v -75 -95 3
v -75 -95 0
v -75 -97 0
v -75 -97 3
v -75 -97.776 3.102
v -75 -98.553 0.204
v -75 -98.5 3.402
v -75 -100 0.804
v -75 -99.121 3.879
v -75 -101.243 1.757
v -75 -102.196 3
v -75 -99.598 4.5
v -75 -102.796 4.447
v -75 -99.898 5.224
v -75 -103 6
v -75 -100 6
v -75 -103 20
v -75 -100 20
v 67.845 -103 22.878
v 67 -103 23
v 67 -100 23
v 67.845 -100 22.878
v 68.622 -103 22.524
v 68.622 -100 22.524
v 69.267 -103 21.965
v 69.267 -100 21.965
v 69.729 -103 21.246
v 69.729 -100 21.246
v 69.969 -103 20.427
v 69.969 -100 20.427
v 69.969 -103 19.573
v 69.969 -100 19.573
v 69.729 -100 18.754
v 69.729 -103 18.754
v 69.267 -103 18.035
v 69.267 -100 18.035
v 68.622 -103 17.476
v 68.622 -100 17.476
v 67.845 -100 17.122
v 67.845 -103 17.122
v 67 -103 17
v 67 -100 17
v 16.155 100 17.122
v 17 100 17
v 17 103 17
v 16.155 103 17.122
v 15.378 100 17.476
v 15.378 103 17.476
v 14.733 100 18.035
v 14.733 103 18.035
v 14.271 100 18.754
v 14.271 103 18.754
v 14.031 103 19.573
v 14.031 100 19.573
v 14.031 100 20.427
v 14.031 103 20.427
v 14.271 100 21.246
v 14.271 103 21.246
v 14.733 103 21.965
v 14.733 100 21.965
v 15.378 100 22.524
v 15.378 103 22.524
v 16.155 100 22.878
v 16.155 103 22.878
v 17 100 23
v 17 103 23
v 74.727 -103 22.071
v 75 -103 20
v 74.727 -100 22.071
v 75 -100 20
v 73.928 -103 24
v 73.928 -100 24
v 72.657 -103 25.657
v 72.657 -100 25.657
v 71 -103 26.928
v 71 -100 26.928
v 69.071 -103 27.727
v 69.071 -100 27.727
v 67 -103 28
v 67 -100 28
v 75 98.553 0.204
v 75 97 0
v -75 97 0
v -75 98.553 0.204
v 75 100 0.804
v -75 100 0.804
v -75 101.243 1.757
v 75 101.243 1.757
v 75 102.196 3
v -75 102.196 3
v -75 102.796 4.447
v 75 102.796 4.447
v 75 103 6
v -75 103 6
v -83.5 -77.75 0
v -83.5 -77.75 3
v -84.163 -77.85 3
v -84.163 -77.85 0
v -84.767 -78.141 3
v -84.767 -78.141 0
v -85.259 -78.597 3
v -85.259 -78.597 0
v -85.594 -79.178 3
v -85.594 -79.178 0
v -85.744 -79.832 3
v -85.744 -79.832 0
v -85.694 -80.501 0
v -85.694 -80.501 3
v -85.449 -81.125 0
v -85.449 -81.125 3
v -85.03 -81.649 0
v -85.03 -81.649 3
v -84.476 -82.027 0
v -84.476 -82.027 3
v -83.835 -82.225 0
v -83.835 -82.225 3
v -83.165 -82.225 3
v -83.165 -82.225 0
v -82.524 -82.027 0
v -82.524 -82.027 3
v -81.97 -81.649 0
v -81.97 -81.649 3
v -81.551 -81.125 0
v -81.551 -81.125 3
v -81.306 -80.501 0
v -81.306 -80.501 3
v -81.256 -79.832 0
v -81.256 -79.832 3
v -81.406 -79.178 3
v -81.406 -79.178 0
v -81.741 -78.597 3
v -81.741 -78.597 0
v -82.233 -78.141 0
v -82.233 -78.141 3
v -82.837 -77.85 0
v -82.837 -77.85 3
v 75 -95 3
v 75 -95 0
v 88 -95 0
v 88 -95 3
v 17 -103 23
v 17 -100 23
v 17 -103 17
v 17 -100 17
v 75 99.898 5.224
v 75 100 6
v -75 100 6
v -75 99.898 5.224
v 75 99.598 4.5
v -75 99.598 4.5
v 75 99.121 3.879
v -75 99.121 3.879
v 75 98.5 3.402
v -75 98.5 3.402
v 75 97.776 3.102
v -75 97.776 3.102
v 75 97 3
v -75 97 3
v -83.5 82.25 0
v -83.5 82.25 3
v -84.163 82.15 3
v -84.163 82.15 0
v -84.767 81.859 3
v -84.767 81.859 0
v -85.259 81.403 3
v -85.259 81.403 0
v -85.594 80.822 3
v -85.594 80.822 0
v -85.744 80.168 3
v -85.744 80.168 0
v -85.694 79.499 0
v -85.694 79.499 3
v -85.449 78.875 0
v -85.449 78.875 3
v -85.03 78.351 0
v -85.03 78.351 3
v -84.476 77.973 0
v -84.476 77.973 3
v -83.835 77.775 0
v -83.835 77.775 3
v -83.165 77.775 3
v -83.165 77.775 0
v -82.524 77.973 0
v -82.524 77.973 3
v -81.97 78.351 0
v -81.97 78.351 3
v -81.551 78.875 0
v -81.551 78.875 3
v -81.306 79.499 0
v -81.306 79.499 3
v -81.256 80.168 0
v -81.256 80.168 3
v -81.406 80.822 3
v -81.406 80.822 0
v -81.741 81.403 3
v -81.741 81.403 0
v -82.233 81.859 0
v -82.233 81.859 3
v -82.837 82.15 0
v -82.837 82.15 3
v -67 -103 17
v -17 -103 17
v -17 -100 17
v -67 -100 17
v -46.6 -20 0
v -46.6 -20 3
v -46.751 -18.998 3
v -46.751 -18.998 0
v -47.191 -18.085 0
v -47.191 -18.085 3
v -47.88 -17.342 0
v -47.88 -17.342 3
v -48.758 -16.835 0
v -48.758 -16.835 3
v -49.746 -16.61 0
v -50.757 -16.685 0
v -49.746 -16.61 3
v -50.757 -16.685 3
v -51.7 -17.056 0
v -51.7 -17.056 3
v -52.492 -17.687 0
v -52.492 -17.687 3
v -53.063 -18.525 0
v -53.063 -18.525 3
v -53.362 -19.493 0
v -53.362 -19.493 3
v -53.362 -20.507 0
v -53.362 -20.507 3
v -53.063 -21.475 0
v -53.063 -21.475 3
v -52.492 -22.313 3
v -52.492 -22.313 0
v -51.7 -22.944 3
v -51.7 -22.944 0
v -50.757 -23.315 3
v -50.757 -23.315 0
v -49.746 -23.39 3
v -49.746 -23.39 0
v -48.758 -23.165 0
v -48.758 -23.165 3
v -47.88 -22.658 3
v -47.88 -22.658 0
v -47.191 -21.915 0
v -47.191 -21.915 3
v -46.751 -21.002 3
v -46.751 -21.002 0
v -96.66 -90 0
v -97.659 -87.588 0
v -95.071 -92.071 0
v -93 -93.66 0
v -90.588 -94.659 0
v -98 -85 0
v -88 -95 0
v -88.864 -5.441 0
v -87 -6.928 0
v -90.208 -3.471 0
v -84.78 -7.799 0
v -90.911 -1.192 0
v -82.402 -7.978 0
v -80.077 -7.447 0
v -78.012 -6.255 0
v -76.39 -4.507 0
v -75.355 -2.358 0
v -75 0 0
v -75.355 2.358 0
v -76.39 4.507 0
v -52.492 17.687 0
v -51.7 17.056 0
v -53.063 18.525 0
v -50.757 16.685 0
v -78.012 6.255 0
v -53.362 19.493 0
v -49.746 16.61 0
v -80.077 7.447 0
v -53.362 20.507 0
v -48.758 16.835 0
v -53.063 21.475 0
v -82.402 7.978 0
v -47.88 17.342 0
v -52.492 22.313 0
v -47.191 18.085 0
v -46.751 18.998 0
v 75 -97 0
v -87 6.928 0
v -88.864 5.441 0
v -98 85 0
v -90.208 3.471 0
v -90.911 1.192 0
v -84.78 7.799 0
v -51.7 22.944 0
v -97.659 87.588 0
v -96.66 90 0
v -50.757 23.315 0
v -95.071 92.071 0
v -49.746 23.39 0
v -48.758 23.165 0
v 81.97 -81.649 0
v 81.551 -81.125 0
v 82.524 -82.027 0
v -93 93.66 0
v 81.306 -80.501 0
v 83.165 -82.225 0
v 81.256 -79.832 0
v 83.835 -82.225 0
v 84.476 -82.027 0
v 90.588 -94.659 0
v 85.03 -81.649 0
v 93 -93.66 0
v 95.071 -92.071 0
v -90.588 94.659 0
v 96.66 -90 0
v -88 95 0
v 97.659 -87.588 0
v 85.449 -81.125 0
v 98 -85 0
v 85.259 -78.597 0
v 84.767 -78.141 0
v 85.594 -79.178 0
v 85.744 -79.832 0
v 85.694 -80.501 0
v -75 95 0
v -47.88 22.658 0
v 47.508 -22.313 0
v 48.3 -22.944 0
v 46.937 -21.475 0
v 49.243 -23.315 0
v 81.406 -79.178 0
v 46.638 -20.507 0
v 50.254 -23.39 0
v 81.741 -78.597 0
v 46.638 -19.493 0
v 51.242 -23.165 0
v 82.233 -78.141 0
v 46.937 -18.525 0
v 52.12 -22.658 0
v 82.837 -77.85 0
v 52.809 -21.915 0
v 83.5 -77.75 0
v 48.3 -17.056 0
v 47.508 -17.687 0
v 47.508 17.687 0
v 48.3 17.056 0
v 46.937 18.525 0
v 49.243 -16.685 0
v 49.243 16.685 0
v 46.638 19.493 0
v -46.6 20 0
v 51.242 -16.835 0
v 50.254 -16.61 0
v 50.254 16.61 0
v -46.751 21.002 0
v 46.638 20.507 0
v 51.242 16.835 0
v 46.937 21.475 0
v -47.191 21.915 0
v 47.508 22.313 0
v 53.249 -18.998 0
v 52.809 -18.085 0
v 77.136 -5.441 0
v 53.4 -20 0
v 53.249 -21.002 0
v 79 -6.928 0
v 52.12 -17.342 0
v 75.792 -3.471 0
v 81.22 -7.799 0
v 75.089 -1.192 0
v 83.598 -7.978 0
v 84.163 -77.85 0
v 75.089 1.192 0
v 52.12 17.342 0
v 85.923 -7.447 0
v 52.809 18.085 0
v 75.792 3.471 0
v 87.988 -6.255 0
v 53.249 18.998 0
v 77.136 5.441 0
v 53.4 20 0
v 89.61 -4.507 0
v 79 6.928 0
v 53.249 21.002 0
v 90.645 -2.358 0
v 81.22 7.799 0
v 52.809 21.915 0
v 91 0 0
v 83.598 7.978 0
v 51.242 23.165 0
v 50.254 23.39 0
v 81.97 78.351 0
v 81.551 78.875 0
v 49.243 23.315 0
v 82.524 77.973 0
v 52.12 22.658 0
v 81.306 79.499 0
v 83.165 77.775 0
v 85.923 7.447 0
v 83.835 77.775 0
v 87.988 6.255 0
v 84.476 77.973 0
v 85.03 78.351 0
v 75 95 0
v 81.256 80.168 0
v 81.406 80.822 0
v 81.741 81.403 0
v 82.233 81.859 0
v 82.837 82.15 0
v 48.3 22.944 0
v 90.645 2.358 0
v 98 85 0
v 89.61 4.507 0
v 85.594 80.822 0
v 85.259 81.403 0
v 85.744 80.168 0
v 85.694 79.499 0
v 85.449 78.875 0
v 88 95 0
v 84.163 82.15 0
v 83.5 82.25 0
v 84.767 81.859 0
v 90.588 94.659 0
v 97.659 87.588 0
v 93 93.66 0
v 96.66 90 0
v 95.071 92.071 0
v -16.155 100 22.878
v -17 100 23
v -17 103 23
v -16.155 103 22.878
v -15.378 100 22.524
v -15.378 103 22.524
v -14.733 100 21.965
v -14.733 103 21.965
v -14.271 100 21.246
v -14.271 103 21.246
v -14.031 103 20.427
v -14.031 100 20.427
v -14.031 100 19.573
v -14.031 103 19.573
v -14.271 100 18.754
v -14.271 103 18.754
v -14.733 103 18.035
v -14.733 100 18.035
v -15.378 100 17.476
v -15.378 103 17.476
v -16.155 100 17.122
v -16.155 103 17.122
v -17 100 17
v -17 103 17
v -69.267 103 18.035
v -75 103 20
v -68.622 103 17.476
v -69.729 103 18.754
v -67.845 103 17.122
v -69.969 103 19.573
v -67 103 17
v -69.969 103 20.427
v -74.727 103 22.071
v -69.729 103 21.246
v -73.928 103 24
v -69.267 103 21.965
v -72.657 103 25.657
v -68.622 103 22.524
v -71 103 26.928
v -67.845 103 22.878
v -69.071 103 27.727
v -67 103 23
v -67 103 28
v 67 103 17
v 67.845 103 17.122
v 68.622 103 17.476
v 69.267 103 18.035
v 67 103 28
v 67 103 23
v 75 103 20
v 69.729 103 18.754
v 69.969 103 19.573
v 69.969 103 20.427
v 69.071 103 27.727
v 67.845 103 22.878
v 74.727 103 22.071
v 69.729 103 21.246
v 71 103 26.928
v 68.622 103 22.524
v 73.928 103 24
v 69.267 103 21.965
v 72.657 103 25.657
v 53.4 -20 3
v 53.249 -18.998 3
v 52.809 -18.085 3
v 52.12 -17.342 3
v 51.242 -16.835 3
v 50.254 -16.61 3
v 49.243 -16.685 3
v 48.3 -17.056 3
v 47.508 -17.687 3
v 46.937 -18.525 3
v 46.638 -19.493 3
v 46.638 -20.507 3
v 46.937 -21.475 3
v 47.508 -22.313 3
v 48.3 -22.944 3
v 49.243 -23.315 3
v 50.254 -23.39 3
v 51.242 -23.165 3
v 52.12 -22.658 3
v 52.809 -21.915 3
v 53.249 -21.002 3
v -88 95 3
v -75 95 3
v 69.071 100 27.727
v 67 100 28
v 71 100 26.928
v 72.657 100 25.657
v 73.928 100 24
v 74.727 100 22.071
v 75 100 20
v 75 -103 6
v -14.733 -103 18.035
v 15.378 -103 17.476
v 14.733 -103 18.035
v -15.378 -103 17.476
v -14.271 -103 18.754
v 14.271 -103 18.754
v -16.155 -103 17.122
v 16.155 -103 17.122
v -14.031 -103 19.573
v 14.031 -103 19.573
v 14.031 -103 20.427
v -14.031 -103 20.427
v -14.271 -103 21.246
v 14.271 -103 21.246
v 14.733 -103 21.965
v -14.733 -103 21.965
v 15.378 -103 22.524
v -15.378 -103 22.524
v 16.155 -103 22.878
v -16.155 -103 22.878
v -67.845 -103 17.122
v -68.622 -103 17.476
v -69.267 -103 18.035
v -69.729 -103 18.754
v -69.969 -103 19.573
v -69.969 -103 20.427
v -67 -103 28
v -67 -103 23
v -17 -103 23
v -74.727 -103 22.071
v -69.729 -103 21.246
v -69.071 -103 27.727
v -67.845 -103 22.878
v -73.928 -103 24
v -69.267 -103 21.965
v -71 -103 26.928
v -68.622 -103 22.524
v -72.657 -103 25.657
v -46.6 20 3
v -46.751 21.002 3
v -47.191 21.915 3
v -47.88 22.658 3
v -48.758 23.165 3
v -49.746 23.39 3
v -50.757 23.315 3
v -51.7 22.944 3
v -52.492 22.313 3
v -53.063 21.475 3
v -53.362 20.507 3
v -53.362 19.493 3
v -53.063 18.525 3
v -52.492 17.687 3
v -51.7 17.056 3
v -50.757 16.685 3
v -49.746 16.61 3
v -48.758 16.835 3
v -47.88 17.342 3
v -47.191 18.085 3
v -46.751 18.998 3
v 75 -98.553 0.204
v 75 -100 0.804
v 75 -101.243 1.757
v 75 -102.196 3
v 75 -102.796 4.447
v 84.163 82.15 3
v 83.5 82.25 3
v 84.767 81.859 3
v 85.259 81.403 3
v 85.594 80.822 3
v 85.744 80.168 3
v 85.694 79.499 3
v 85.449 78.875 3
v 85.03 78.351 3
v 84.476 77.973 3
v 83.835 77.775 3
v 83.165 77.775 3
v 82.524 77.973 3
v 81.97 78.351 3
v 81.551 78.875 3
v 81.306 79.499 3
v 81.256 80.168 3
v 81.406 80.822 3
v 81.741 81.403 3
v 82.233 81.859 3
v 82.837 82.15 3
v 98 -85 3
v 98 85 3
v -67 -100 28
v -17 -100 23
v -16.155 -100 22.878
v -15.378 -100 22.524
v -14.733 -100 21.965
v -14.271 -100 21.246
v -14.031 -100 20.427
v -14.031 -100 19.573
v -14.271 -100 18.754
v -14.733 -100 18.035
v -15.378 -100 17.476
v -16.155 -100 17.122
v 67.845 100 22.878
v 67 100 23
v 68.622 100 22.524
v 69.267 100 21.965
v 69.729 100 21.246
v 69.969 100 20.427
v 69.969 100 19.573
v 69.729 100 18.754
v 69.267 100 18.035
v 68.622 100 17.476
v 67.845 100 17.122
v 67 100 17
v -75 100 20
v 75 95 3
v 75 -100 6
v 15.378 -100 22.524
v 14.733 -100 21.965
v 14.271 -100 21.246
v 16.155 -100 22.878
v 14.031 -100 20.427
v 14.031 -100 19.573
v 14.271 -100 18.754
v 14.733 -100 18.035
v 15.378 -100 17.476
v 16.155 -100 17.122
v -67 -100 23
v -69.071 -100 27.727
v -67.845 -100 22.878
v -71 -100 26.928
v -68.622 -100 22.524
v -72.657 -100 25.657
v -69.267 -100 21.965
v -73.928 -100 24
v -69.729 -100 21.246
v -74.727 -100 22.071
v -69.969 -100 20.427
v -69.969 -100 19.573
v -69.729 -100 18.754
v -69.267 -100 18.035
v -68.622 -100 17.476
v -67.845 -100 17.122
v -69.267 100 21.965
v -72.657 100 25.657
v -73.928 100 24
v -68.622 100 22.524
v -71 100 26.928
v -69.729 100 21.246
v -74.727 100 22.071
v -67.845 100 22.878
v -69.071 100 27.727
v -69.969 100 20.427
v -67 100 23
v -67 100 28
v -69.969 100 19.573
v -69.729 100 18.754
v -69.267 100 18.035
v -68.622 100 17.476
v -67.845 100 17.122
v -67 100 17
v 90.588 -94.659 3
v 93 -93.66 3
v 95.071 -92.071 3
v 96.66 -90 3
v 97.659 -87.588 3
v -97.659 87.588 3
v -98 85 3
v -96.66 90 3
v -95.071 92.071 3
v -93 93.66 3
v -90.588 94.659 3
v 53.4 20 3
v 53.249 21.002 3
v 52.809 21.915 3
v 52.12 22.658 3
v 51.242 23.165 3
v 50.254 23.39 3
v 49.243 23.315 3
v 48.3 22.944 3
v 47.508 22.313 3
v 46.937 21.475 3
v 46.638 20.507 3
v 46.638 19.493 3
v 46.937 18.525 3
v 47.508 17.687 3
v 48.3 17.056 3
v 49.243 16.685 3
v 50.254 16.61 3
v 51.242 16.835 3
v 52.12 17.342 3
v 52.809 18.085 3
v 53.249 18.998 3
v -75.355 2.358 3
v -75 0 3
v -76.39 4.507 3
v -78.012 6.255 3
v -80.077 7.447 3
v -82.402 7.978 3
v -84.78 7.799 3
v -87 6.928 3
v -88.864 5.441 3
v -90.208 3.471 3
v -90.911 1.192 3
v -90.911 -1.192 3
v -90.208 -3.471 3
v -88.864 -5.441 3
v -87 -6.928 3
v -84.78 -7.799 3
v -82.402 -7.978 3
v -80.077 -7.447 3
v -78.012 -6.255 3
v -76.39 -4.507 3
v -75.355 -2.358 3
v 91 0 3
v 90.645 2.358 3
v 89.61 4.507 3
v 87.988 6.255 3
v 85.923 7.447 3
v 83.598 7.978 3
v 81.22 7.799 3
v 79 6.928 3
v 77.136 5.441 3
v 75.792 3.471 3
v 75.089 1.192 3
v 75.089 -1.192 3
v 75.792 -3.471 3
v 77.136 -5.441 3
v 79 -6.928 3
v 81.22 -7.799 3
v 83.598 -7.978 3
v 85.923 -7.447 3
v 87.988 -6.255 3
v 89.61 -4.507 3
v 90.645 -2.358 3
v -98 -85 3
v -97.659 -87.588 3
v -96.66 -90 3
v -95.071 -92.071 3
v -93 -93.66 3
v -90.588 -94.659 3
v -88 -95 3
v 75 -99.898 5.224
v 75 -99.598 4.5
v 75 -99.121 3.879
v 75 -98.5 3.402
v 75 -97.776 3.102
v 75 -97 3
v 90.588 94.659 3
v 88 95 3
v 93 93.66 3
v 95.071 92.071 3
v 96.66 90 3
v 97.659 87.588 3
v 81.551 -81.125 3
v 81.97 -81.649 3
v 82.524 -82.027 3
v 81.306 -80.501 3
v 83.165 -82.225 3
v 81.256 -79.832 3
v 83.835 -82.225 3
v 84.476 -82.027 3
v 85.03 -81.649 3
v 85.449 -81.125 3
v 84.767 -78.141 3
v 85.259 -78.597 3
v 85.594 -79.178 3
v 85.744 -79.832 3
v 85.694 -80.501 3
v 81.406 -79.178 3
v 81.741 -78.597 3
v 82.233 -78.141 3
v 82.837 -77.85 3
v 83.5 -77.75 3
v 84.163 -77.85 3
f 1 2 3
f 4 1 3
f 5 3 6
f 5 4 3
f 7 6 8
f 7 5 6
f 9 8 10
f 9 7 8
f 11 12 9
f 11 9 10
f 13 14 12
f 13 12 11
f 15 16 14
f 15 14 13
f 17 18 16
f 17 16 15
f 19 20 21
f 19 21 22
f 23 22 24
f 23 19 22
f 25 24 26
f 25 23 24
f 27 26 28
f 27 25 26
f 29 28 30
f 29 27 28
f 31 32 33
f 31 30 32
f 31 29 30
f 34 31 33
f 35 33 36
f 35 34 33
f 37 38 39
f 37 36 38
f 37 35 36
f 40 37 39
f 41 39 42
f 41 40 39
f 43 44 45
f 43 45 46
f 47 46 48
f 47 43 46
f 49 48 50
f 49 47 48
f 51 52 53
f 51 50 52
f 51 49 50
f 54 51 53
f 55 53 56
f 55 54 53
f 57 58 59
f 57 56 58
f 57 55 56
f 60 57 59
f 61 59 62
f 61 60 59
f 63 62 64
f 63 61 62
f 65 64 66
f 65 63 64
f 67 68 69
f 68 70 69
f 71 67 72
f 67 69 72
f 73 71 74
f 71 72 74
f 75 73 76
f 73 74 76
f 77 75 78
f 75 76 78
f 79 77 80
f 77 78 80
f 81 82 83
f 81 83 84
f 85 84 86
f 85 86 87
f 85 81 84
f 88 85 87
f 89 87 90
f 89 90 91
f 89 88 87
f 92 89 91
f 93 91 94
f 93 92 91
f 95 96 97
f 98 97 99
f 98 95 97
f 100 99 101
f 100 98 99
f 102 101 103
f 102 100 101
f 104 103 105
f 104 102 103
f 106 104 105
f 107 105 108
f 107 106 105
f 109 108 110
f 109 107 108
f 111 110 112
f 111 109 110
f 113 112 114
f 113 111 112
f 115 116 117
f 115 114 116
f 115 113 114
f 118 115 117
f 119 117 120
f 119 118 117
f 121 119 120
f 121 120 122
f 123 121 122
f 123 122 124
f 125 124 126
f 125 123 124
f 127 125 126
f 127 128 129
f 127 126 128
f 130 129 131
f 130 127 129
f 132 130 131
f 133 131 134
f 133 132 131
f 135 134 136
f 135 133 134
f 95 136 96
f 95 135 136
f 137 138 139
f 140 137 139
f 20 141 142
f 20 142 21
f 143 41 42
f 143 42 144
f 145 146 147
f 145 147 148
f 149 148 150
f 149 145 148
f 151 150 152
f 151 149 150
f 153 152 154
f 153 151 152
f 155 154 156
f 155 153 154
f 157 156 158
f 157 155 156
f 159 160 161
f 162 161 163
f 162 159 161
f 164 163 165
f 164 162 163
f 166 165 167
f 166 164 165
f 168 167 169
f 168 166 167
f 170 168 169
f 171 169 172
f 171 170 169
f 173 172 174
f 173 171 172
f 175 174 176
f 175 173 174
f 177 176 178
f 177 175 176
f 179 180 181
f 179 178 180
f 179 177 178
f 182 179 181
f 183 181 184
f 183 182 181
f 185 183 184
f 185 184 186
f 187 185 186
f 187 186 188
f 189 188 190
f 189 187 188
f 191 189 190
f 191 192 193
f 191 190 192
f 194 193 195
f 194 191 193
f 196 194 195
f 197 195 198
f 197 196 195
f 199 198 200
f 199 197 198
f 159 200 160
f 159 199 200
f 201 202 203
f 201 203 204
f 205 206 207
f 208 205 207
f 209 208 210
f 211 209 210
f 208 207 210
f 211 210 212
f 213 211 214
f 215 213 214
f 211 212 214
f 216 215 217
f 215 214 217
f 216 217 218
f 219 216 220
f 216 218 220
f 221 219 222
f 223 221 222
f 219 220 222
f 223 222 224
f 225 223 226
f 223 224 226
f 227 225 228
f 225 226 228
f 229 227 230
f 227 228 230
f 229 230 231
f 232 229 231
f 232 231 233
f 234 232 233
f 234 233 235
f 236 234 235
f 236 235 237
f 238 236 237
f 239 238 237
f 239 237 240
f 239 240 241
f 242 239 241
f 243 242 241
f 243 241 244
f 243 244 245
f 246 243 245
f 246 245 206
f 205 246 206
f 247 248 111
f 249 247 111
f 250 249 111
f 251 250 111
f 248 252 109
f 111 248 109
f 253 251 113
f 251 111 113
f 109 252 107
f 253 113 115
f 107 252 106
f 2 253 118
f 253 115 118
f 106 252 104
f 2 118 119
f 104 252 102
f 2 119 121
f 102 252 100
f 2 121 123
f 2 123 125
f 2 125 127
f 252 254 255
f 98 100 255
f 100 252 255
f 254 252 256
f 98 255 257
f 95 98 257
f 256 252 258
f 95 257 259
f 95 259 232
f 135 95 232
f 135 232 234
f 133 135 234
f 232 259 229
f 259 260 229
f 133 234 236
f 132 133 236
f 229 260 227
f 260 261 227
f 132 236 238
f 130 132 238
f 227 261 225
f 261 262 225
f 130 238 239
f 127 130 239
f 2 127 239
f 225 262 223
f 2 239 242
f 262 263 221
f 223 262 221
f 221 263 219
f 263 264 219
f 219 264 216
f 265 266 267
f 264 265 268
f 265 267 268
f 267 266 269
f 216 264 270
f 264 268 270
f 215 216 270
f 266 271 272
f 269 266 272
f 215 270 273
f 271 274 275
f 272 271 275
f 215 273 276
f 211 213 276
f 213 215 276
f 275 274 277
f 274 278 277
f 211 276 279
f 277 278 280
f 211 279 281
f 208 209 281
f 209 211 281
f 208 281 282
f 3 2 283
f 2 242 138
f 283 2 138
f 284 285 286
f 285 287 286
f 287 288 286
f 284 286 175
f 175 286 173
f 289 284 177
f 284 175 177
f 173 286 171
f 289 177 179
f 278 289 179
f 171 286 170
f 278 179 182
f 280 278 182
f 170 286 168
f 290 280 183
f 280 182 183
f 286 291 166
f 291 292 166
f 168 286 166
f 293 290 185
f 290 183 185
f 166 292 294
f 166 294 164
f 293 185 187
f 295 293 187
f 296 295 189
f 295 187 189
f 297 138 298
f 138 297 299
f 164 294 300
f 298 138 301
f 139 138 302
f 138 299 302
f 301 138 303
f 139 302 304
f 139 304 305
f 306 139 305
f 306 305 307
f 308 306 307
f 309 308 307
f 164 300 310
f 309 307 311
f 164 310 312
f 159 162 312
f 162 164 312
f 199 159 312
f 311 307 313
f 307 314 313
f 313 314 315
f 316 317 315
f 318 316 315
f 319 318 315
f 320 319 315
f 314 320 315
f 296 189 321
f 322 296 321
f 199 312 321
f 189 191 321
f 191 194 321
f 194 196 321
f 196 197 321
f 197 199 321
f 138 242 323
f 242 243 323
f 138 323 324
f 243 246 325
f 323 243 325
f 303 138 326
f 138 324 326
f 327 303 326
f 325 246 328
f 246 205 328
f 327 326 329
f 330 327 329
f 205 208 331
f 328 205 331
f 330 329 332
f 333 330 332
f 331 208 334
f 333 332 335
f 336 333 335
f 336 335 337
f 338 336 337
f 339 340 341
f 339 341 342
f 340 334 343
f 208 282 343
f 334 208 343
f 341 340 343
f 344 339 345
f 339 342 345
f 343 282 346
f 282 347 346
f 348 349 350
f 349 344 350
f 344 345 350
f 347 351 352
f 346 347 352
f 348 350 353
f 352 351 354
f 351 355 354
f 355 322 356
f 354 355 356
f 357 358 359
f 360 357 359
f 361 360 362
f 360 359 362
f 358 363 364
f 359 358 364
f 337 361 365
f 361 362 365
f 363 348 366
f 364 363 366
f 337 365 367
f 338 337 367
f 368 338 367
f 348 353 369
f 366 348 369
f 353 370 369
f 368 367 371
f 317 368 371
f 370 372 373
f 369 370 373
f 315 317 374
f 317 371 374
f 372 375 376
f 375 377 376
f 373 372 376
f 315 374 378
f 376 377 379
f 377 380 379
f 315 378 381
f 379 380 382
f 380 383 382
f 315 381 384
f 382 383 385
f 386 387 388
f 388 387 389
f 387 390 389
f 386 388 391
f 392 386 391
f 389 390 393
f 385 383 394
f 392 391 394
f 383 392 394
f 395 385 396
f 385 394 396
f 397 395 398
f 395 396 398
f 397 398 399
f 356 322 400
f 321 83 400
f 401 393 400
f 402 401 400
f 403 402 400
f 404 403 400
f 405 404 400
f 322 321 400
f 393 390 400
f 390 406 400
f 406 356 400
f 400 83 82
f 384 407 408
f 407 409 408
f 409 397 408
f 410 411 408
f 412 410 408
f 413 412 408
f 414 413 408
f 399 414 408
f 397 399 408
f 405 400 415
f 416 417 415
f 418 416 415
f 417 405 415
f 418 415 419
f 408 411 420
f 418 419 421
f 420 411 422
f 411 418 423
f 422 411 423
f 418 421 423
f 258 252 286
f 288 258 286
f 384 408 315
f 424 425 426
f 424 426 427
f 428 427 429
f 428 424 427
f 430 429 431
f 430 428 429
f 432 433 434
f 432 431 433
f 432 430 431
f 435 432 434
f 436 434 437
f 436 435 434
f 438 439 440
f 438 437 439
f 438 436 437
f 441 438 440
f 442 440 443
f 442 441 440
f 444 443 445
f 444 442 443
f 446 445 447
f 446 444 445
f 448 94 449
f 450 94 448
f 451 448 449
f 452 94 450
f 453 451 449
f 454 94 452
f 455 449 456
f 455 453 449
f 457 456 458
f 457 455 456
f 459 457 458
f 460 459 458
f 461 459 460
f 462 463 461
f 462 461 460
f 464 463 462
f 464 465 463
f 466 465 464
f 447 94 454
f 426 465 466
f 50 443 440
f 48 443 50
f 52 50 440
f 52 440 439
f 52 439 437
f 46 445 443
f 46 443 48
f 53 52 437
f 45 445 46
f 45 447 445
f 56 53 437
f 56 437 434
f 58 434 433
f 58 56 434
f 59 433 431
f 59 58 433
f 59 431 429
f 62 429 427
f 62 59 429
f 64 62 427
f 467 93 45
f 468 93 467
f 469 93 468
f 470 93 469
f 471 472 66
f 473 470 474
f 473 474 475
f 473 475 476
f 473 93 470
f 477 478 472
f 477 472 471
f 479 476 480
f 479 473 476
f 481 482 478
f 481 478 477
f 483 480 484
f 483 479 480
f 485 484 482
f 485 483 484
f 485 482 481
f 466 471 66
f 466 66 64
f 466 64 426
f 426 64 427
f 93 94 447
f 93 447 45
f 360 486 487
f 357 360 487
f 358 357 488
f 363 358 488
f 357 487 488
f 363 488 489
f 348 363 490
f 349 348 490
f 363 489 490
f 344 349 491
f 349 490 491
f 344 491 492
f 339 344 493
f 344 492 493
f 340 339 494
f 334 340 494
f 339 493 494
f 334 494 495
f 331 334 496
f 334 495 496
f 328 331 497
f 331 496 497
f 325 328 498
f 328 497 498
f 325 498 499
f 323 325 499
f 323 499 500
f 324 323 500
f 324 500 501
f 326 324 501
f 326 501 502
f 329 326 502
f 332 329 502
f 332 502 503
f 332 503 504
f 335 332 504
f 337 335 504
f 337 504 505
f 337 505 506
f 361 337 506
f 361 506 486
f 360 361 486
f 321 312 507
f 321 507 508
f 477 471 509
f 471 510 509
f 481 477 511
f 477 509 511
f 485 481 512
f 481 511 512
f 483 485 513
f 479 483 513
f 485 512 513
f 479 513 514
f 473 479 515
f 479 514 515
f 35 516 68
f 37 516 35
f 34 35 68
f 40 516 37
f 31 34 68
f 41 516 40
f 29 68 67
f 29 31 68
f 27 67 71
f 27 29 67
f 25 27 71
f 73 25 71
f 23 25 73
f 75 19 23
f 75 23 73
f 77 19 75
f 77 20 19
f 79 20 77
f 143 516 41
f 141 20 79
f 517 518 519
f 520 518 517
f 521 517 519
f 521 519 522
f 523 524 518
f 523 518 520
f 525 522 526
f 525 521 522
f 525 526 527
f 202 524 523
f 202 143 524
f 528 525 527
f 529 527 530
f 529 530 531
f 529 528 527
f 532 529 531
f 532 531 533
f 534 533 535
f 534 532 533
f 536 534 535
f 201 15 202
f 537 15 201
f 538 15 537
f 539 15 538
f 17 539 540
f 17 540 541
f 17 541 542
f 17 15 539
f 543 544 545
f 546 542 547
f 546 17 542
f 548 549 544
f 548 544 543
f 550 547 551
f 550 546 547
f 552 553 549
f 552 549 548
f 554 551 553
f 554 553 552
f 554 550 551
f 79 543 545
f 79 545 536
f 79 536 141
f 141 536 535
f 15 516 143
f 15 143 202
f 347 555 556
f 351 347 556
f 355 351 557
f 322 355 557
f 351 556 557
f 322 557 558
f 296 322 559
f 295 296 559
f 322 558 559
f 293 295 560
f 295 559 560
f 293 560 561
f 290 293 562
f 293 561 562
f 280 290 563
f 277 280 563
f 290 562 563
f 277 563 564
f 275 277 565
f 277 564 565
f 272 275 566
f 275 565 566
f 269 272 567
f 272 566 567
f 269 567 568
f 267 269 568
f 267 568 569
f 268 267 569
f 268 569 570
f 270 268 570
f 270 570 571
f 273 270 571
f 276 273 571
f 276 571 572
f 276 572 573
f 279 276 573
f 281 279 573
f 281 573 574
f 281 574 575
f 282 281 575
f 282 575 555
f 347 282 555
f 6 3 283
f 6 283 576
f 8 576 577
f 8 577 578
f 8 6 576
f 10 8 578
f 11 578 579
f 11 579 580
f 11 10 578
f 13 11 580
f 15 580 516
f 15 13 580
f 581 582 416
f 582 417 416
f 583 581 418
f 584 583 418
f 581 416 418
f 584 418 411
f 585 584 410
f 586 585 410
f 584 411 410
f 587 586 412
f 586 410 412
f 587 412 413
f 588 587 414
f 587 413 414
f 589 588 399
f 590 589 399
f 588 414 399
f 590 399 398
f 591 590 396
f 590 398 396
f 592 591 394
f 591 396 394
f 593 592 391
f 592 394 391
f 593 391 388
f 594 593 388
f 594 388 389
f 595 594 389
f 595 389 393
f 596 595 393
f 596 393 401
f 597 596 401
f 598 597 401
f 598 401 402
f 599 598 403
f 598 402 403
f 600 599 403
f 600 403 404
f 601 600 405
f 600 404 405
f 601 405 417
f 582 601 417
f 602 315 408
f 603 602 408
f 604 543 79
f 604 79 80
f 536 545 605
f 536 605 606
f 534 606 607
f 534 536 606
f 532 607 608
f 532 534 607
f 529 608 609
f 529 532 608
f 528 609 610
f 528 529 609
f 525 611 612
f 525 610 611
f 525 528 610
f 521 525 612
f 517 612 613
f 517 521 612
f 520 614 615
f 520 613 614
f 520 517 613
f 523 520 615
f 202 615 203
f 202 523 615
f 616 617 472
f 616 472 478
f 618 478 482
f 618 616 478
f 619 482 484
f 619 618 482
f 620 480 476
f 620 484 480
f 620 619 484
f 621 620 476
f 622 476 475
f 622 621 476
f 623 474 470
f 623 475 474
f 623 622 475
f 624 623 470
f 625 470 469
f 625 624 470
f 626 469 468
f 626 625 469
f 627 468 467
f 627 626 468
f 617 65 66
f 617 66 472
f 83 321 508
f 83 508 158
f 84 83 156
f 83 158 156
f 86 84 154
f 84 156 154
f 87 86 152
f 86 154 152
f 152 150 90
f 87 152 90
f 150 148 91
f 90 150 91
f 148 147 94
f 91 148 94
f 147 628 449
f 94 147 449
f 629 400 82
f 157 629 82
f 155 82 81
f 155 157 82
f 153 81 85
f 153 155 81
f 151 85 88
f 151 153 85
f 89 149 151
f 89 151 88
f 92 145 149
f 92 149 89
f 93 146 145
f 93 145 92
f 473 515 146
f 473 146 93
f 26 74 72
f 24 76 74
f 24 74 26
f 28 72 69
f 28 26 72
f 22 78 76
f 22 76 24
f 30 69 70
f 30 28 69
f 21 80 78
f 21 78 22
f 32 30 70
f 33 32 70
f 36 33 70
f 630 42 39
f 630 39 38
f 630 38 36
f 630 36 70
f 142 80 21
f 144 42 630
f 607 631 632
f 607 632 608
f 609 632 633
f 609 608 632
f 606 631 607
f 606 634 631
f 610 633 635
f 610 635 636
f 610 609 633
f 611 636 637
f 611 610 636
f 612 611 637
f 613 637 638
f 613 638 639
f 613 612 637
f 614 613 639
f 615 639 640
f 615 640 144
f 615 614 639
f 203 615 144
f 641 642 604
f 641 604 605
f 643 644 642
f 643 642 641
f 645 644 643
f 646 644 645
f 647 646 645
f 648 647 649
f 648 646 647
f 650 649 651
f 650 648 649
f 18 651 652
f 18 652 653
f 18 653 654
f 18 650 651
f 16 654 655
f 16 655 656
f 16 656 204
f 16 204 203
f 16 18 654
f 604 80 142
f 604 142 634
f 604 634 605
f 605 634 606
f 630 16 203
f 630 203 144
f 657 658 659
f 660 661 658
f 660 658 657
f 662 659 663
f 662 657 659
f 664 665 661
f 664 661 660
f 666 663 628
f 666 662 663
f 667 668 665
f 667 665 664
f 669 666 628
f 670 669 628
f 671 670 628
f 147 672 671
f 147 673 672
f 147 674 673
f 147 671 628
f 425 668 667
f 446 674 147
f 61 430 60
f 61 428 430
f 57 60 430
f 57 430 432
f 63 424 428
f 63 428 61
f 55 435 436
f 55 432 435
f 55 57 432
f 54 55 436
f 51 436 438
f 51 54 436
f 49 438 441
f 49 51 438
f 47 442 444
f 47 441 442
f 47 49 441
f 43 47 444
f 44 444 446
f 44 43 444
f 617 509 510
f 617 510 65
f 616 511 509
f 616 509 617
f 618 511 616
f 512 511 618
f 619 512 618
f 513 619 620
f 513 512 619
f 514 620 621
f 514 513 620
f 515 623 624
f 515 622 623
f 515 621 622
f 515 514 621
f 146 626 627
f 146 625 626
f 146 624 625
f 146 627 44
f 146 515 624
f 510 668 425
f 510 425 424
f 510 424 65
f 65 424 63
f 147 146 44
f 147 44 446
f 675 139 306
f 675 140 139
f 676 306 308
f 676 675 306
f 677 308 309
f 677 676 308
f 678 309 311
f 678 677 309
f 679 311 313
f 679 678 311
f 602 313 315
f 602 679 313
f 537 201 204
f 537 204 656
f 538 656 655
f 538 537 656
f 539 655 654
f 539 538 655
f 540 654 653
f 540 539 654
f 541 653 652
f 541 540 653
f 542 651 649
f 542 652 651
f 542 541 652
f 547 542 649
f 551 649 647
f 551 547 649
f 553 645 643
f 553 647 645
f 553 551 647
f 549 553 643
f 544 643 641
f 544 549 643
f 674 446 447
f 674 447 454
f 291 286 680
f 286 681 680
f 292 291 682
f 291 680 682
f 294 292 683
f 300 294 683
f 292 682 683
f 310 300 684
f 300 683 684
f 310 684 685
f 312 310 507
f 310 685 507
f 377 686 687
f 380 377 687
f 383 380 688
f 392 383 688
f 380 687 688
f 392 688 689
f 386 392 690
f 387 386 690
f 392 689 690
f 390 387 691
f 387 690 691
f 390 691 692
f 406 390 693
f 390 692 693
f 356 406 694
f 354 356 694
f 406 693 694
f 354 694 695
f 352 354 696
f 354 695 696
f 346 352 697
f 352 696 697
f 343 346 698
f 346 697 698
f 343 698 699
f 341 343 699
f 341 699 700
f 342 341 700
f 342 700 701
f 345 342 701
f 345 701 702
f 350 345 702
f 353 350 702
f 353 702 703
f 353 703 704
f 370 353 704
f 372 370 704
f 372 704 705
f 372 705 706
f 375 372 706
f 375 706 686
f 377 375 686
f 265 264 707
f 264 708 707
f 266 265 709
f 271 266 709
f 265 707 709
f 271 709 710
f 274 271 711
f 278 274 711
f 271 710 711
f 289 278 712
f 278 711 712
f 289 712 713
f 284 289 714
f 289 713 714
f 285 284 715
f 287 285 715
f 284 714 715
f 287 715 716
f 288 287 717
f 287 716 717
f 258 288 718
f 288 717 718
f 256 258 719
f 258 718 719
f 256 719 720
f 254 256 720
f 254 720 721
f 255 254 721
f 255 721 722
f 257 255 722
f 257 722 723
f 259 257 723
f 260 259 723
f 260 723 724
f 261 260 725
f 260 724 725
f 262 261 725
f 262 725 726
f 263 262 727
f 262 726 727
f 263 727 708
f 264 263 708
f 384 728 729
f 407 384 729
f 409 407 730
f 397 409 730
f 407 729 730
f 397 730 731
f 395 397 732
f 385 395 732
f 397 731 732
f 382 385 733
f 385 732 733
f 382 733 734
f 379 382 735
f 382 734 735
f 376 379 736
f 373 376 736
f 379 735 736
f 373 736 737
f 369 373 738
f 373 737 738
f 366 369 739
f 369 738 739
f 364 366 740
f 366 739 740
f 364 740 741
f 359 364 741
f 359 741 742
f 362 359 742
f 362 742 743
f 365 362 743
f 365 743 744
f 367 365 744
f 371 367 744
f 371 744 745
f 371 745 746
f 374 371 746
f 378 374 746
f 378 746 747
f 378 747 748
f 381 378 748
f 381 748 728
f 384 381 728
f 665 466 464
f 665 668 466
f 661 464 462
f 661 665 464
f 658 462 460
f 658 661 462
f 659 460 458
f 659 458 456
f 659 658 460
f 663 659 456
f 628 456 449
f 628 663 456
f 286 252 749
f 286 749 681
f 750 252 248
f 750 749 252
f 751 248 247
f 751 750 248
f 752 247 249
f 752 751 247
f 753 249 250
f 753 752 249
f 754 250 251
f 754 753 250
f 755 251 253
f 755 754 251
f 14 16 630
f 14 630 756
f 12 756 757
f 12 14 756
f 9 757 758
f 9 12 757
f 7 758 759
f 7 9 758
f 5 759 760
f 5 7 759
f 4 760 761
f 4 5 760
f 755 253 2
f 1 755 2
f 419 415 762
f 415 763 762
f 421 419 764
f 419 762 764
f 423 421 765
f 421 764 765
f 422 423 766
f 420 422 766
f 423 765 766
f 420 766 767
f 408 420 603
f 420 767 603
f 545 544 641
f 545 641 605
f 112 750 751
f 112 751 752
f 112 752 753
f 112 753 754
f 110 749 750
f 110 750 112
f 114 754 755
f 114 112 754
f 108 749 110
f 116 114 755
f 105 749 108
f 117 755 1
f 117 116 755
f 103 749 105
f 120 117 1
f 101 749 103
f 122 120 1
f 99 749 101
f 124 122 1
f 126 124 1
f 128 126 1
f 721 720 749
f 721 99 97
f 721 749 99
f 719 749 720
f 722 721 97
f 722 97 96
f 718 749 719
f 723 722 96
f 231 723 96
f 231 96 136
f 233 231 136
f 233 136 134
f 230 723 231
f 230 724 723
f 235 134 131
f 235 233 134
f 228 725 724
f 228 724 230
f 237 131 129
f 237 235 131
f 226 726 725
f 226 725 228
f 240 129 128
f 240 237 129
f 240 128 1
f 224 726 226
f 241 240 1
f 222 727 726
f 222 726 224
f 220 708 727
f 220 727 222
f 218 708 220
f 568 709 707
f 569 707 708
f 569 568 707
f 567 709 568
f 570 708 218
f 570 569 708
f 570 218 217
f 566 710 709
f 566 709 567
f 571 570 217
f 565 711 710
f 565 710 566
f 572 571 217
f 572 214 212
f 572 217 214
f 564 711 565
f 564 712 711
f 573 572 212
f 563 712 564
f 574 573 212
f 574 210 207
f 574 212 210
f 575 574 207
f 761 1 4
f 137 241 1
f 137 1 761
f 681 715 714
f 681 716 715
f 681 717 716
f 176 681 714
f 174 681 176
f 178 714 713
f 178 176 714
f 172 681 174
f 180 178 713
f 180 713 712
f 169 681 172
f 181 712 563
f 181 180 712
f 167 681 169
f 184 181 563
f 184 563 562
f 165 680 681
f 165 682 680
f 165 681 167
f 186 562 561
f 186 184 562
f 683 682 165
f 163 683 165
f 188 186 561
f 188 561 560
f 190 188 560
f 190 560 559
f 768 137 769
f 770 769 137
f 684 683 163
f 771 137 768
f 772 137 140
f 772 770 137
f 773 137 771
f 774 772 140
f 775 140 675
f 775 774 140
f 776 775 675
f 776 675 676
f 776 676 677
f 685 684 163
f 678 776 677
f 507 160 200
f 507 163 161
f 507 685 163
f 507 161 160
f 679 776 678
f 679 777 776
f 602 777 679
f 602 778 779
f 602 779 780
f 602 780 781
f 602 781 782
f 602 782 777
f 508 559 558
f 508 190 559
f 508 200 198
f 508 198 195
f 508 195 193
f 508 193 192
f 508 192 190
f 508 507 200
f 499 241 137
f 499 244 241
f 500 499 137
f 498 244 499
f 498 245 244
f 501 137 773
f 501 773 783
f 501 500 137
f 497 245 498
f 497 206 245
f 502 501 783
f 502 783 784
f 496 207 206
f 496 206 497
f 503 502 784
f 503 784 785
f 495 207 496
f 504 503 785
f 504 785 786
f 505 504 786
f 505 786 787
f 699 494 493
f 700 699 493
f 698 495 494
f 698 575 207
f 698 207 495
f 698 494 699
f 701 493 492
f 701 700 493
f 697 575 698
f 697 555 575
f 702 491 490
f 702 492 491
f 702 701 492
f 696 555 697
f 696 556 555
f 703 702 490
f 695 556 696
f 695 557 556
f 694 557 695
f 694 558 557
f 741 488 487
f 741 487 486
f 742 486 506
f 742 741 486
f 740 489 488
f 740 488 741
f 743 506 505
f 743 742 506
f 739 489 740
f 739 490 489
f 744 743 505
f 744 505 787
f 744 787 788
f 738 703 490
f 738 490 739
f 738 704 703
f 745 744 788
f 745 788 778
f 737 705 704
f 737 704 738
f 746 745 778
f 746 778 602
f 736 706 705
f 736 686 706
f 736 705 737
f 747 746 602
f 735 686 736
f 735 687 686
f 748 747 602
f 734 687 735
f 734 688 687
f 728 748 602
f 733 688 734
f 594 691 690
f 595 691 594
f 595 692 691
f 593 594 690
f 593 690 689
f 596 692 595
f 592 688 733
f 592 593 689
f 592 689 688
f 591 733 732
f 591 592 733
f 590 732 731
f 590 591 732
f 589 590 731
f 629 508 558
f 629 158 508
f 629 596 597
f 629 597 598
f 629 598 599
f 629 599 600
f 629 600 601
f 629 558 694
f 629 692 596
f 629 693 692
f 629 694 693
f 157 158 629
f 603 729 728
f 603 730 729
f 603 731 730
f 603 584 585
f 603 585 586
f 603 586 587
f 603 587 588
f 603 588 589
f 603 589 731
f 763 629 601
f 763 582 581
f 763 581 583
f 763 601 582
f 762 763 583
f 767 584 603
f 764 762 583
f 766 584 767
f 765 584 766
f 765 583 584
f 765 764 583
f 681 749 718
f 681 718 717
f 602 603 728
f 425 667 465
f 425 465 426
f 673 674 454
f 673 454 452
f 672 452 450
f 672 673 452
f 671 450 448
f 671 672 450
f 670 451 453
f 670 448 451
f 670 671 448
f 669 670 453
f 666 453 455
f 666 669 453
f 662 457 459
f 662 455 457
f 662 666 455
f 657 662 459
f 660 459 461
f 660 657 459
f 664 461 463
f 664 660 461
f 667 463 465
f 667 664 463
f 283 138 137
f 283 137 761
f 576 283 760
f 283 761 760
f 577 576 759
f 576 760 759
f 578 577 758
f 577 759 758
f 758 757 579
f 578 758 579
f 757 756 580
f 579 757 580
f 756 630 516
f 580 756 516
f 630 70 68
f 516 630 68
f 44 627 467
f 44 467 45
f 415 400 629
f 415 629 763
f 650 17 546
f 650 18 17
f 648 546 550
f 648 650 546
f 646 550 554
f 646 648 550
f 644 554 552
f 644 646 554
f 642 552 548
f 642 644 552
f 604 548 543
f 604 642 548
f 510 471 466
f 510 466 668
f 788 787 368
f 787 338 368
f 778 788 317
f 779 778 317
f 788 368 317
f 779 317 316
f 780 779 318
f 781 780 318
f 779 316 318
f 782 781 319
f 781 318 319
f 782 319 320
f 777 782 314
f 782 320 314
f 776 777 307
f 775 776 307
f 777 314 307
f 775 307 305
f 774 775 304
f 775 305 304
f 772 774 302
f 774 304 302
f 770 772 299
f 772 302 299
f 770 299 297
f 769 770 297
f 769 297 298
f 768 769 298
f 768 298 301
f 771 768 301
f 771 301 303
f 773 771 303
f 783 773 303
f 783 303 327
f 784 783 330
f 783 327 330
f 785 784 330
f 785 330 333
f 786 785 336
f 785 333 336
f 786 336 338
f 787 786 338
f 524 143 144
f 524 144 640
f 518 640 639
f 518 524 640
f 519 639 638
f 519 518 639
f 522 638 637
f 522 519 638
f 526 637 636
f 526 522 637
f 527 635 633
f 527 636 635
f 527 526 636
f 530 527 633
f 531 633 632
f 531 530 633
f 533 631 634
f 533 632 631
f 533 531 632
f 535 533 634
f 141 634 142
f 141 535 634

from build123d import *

# Parameters (mm, degrees)
CROQUIS1_W                       = 196
CROQUIS1_H                       = 190
SALIENTE_EXTRUIR1_DEPTH          = 3
CROQUIS3_R                       = 8
CORTAR_EXTRUIR1_DEPTH            = 50
REDONDEO1_R                      = 10
TALADRO_ROSCADO_M81_D            = 6.8
TALADRO_ROSCADO_M81_DEPTH        = 17
TALADRO_ROSCADO_M81_TIP          = 2.042926105
MATRIZL1_COUNT                   = 2
MATRIZL1_PITCH                   = 160
CROQUIS12_W                      = 150
CROQUIS12_H                      = 2
SALIENTE_EXTRUIR6_DEPTH          = 3
BRIDA_DE_ARISTA1_DEPTH           = 150
BRIDA_DE_ARISTA1_BEND_DEPTH      = 150
REDONDEO5_R                      = 8
TALADRO_DE_MARGEN_PARA_M51_D     = 5.5
TALADRO_DE_MARGEN_PARA_M51_DEPTH = 500
TALADRO_DE_MARGEN_PARA_M51_TIP   = 1.652366702
CORTAR_EXTRUIR2_DEPTH            = 230.834723225


# Sheet-metal steps are written as plain solids
with BuildPart() as part:
    # Croquis1 → Saliente-Extruir1 (new body)
    with BuildSketch(Plane.XY):
        Rectangle(CROQUIS1_W, CROQUIS1_H)
    extrude(amount=SALIENTE_EXTRUIR1_DEPTH)

    # Croquis3 → Cortar-Extruir1 (cut, symmetric)
    with BuildSketch(Plane.XY.offset(3)):
        with Locations((83, 0)):
            Circle(CROQUIS3_R)
        with Locations((-83, 0)):
            Circle(CROQUIS3_R)
    extrude(amount=CORTAR_EXTRUIR1_DEPTH, both=True, mode=Mode.SUBTRACT)

    # Redondeo1
    redondeo1_edges = [part.edges().sort_by_distance(p)[0] for p in [
        (-98, 95, 1.5),
        (98, 95, 1.5),
        (98, -95, 1.5),
        (-98, -95, 1.5),
    ]]
    fillet(redondeo1_edges, radius=REDONDEO1_R)

    # Taladro roscado M81
    with Locations(Plane(origin=(0, 0, 0), x_dir=(-1, 0, 0), z_dir=(0, 0, -1))):
        with Locations((-50, 20), (-50, -20), (50, 20), (50, -20)):
            Hole(TALADRO_ROSCADO_M81_D / 2, depth=TALADRO_ROSCADO_M81_DEPTH)
            with Locations((0, 0, -(TALADRO_ROSCADO_M81_DEPTH + TALADRO_ROSCADO_M81_TIP / 2))):  # 118° drill point
                Cone(0, TALADRO_ROSCADO_M81_D / 2, TALADRO_ROSCADO_M81_TIP, mode=Mode.SUBTRACT)

    # Croquis9 → Taladro de margen para M41 (revolve, cut)
    with BuildSketch(Plane(origin=(-83.5, -80, 0), x_dir=(0, 1, 0), z_dir=(1, 0, 0))):
        Polygon((0, 0), (0, 501.351936393), (2.25, 500), (2.25, 0), align=None)
    taladro_de_margen_para_m41 = revolve(axis=Axis((-83.5, -80, -6.35), (0, 0, 1)), mode=Mode.SUBTRACT)

    # MatrizL1: Taladro de margen para M41 ×2
    with Locations(*[(0, i * MATRIZL1_PITCH, 0) for i in range(1, MATRIZL1_COUNT)]):
        add(taladro_de_margen_para_m41, mode=Mode.SUBTRACT)

    # Simetría3: Taladro de margen para M41 across plane
    add(taladro_de_margen_para_m41.mirror(Plane(origin=(0, 0, 0), x_dir=(0, 0, 1), z_dir=(1, 0, 0))), mode=Mode.SUBTRACT)

    # Simetría3 copy 1 sketch → Simetría3 copy 1 (revolve, cut)
    with BuildSketch(Plane(origin=(83.5, 80, 0), x_dir=(0, 1, 0), z_dir=(-1, 0, 0))):
        Polygon((0, 0), (0, -501.351936393), (2.25, -500), (2.25, 0), align=None)
    revolve(axis=Axis((83.5, 80, -6.35), (0, 0, -1)), mode=Mode.SUBTRACT)

    # Croquis12 → Saliente-Extruir6 (add)
    with BuildSketch(Plane.XY.offset(3)):
        with Locations((0, 96)):
            Rectangle(CROQUIS12_W, CROQUIS12_H)
    saliente_extruir6 = extrude(amount=-SALIENTE_EXTRUIR6_DEPTH)

    # Simetría4: Saliente-Extruir6 across plane
    add(saliente_extruir6.mirror(Plane.ZX))

    # Brida de arista1 section (across the edge) → Brida de arista1 (add)
    with BuildSketch(Plane(origin=(-75, -100, 3), x_dir=(0, 1, 0), z_dir=(1, 0, 0))):
        with BuildLine():
            Line((-3, 3), (-3, 25))
            Line((-3, 25), (0, 25))
            Line((0, 25), (0, 3))
            ThreePointArc((0, 3), (0.878679656, 0.878679656), (3, 0))
            Line((3, 0), (3, -3))
            ThreePointArc((3, -3), (-1.242640687, -1.242640687), (-3, 3))
        make_face()
    extrude(amount=BRIDA_DE_ARISTA1_DEPTH)

    # Brida de arista1 section 2 (across the edge) → Brida de arista1 bend (add)
    with BuildSketch(Plane(origin=(75, 100, 3), x_dir=(0, -1, 0), z_dir=(-1, 0, 0))):
        with BuildLine():
            Line((-3, 3), (-3, 25))
            Line((-3, 25), (0, 25))
            Line((0, 25), (0, 3))
            ThreePointArc((0, 3), (0.878679656, 0.878679656), (3, 0))
            Line((3, 0), (3, -3))
            ThreePointArc((3, -3), (-1.242640687, -1.242640687), (-3, 3))
        make_face()
    extrude(amount=BRIDA_DE_ARISTA1_BEND_DEPTH)

    # Redondeo5
    redondeo5_edges = [part.edges().sort_by_distance(p)[0] for p in [
        (-75, -101.5, 28),
        (75, -101.5, 28),
        (75, 101.5, 28),
        (-75, 101.5, 28),
    ]]
    fillet(redondeo5_edges, radius=REDONDEO5_R)

    # Taladro de margen para M51
    with Locations(Plane(origin=(0, -103, 0), x_dir=(-1, 0, 0), z_dir=(0, -1, 0))):
        with Locations((67, -20), (-67, -20), (17, -20), (-17, -20)):
            Hole(TALADRO_DE_MARGEN_PARA_M51_D / 2, depth=TALADRO_DE_MARGEN_PARA_M51_DEPTH)
            with Locations((0, 0, -(TALADRO_DE_MARGEN_PARA_M51_DEPTH + TALADRO_DE_MARGEN_PARA_M51_TIP / 2))):  # 118° drill point
                Cone(0, TALADRO_DE_MARGEN_PARA_M51_D / 2, TALADRO_DE_MARGEN_PARA_M51_TIP, mode=Mode.SUBTRACT)

    # Croquis25 → Cortar-Extruir2 (cut, through all)
    with BuildSketch(Plane.XZ.offset(103)):
        with BuildLine():
            Line((67, 17), (17, 17))
            ThreePointArc((17, 17), (14, 20), (17, 23))
            Line((17, 23), (67, 23))
            ThreePointArc((67, 23), (70, 20), (67, 17))
        make_face()
        with BuildLine():
            Line((-17, 17), (-67, 17))
            ThreePointArc((-67, 17), (-70, 20), (-67, 23))
            Line((-67, 23), (-17, 23))
            ThreePointArc((-17, 23), (-14, 20), (-17, 17))
        make_face()
    extrude(amount=-CORTAR_EXTRUIR2_DEPTH, mode=Mode.SUBTRACT)


solid = part.part
